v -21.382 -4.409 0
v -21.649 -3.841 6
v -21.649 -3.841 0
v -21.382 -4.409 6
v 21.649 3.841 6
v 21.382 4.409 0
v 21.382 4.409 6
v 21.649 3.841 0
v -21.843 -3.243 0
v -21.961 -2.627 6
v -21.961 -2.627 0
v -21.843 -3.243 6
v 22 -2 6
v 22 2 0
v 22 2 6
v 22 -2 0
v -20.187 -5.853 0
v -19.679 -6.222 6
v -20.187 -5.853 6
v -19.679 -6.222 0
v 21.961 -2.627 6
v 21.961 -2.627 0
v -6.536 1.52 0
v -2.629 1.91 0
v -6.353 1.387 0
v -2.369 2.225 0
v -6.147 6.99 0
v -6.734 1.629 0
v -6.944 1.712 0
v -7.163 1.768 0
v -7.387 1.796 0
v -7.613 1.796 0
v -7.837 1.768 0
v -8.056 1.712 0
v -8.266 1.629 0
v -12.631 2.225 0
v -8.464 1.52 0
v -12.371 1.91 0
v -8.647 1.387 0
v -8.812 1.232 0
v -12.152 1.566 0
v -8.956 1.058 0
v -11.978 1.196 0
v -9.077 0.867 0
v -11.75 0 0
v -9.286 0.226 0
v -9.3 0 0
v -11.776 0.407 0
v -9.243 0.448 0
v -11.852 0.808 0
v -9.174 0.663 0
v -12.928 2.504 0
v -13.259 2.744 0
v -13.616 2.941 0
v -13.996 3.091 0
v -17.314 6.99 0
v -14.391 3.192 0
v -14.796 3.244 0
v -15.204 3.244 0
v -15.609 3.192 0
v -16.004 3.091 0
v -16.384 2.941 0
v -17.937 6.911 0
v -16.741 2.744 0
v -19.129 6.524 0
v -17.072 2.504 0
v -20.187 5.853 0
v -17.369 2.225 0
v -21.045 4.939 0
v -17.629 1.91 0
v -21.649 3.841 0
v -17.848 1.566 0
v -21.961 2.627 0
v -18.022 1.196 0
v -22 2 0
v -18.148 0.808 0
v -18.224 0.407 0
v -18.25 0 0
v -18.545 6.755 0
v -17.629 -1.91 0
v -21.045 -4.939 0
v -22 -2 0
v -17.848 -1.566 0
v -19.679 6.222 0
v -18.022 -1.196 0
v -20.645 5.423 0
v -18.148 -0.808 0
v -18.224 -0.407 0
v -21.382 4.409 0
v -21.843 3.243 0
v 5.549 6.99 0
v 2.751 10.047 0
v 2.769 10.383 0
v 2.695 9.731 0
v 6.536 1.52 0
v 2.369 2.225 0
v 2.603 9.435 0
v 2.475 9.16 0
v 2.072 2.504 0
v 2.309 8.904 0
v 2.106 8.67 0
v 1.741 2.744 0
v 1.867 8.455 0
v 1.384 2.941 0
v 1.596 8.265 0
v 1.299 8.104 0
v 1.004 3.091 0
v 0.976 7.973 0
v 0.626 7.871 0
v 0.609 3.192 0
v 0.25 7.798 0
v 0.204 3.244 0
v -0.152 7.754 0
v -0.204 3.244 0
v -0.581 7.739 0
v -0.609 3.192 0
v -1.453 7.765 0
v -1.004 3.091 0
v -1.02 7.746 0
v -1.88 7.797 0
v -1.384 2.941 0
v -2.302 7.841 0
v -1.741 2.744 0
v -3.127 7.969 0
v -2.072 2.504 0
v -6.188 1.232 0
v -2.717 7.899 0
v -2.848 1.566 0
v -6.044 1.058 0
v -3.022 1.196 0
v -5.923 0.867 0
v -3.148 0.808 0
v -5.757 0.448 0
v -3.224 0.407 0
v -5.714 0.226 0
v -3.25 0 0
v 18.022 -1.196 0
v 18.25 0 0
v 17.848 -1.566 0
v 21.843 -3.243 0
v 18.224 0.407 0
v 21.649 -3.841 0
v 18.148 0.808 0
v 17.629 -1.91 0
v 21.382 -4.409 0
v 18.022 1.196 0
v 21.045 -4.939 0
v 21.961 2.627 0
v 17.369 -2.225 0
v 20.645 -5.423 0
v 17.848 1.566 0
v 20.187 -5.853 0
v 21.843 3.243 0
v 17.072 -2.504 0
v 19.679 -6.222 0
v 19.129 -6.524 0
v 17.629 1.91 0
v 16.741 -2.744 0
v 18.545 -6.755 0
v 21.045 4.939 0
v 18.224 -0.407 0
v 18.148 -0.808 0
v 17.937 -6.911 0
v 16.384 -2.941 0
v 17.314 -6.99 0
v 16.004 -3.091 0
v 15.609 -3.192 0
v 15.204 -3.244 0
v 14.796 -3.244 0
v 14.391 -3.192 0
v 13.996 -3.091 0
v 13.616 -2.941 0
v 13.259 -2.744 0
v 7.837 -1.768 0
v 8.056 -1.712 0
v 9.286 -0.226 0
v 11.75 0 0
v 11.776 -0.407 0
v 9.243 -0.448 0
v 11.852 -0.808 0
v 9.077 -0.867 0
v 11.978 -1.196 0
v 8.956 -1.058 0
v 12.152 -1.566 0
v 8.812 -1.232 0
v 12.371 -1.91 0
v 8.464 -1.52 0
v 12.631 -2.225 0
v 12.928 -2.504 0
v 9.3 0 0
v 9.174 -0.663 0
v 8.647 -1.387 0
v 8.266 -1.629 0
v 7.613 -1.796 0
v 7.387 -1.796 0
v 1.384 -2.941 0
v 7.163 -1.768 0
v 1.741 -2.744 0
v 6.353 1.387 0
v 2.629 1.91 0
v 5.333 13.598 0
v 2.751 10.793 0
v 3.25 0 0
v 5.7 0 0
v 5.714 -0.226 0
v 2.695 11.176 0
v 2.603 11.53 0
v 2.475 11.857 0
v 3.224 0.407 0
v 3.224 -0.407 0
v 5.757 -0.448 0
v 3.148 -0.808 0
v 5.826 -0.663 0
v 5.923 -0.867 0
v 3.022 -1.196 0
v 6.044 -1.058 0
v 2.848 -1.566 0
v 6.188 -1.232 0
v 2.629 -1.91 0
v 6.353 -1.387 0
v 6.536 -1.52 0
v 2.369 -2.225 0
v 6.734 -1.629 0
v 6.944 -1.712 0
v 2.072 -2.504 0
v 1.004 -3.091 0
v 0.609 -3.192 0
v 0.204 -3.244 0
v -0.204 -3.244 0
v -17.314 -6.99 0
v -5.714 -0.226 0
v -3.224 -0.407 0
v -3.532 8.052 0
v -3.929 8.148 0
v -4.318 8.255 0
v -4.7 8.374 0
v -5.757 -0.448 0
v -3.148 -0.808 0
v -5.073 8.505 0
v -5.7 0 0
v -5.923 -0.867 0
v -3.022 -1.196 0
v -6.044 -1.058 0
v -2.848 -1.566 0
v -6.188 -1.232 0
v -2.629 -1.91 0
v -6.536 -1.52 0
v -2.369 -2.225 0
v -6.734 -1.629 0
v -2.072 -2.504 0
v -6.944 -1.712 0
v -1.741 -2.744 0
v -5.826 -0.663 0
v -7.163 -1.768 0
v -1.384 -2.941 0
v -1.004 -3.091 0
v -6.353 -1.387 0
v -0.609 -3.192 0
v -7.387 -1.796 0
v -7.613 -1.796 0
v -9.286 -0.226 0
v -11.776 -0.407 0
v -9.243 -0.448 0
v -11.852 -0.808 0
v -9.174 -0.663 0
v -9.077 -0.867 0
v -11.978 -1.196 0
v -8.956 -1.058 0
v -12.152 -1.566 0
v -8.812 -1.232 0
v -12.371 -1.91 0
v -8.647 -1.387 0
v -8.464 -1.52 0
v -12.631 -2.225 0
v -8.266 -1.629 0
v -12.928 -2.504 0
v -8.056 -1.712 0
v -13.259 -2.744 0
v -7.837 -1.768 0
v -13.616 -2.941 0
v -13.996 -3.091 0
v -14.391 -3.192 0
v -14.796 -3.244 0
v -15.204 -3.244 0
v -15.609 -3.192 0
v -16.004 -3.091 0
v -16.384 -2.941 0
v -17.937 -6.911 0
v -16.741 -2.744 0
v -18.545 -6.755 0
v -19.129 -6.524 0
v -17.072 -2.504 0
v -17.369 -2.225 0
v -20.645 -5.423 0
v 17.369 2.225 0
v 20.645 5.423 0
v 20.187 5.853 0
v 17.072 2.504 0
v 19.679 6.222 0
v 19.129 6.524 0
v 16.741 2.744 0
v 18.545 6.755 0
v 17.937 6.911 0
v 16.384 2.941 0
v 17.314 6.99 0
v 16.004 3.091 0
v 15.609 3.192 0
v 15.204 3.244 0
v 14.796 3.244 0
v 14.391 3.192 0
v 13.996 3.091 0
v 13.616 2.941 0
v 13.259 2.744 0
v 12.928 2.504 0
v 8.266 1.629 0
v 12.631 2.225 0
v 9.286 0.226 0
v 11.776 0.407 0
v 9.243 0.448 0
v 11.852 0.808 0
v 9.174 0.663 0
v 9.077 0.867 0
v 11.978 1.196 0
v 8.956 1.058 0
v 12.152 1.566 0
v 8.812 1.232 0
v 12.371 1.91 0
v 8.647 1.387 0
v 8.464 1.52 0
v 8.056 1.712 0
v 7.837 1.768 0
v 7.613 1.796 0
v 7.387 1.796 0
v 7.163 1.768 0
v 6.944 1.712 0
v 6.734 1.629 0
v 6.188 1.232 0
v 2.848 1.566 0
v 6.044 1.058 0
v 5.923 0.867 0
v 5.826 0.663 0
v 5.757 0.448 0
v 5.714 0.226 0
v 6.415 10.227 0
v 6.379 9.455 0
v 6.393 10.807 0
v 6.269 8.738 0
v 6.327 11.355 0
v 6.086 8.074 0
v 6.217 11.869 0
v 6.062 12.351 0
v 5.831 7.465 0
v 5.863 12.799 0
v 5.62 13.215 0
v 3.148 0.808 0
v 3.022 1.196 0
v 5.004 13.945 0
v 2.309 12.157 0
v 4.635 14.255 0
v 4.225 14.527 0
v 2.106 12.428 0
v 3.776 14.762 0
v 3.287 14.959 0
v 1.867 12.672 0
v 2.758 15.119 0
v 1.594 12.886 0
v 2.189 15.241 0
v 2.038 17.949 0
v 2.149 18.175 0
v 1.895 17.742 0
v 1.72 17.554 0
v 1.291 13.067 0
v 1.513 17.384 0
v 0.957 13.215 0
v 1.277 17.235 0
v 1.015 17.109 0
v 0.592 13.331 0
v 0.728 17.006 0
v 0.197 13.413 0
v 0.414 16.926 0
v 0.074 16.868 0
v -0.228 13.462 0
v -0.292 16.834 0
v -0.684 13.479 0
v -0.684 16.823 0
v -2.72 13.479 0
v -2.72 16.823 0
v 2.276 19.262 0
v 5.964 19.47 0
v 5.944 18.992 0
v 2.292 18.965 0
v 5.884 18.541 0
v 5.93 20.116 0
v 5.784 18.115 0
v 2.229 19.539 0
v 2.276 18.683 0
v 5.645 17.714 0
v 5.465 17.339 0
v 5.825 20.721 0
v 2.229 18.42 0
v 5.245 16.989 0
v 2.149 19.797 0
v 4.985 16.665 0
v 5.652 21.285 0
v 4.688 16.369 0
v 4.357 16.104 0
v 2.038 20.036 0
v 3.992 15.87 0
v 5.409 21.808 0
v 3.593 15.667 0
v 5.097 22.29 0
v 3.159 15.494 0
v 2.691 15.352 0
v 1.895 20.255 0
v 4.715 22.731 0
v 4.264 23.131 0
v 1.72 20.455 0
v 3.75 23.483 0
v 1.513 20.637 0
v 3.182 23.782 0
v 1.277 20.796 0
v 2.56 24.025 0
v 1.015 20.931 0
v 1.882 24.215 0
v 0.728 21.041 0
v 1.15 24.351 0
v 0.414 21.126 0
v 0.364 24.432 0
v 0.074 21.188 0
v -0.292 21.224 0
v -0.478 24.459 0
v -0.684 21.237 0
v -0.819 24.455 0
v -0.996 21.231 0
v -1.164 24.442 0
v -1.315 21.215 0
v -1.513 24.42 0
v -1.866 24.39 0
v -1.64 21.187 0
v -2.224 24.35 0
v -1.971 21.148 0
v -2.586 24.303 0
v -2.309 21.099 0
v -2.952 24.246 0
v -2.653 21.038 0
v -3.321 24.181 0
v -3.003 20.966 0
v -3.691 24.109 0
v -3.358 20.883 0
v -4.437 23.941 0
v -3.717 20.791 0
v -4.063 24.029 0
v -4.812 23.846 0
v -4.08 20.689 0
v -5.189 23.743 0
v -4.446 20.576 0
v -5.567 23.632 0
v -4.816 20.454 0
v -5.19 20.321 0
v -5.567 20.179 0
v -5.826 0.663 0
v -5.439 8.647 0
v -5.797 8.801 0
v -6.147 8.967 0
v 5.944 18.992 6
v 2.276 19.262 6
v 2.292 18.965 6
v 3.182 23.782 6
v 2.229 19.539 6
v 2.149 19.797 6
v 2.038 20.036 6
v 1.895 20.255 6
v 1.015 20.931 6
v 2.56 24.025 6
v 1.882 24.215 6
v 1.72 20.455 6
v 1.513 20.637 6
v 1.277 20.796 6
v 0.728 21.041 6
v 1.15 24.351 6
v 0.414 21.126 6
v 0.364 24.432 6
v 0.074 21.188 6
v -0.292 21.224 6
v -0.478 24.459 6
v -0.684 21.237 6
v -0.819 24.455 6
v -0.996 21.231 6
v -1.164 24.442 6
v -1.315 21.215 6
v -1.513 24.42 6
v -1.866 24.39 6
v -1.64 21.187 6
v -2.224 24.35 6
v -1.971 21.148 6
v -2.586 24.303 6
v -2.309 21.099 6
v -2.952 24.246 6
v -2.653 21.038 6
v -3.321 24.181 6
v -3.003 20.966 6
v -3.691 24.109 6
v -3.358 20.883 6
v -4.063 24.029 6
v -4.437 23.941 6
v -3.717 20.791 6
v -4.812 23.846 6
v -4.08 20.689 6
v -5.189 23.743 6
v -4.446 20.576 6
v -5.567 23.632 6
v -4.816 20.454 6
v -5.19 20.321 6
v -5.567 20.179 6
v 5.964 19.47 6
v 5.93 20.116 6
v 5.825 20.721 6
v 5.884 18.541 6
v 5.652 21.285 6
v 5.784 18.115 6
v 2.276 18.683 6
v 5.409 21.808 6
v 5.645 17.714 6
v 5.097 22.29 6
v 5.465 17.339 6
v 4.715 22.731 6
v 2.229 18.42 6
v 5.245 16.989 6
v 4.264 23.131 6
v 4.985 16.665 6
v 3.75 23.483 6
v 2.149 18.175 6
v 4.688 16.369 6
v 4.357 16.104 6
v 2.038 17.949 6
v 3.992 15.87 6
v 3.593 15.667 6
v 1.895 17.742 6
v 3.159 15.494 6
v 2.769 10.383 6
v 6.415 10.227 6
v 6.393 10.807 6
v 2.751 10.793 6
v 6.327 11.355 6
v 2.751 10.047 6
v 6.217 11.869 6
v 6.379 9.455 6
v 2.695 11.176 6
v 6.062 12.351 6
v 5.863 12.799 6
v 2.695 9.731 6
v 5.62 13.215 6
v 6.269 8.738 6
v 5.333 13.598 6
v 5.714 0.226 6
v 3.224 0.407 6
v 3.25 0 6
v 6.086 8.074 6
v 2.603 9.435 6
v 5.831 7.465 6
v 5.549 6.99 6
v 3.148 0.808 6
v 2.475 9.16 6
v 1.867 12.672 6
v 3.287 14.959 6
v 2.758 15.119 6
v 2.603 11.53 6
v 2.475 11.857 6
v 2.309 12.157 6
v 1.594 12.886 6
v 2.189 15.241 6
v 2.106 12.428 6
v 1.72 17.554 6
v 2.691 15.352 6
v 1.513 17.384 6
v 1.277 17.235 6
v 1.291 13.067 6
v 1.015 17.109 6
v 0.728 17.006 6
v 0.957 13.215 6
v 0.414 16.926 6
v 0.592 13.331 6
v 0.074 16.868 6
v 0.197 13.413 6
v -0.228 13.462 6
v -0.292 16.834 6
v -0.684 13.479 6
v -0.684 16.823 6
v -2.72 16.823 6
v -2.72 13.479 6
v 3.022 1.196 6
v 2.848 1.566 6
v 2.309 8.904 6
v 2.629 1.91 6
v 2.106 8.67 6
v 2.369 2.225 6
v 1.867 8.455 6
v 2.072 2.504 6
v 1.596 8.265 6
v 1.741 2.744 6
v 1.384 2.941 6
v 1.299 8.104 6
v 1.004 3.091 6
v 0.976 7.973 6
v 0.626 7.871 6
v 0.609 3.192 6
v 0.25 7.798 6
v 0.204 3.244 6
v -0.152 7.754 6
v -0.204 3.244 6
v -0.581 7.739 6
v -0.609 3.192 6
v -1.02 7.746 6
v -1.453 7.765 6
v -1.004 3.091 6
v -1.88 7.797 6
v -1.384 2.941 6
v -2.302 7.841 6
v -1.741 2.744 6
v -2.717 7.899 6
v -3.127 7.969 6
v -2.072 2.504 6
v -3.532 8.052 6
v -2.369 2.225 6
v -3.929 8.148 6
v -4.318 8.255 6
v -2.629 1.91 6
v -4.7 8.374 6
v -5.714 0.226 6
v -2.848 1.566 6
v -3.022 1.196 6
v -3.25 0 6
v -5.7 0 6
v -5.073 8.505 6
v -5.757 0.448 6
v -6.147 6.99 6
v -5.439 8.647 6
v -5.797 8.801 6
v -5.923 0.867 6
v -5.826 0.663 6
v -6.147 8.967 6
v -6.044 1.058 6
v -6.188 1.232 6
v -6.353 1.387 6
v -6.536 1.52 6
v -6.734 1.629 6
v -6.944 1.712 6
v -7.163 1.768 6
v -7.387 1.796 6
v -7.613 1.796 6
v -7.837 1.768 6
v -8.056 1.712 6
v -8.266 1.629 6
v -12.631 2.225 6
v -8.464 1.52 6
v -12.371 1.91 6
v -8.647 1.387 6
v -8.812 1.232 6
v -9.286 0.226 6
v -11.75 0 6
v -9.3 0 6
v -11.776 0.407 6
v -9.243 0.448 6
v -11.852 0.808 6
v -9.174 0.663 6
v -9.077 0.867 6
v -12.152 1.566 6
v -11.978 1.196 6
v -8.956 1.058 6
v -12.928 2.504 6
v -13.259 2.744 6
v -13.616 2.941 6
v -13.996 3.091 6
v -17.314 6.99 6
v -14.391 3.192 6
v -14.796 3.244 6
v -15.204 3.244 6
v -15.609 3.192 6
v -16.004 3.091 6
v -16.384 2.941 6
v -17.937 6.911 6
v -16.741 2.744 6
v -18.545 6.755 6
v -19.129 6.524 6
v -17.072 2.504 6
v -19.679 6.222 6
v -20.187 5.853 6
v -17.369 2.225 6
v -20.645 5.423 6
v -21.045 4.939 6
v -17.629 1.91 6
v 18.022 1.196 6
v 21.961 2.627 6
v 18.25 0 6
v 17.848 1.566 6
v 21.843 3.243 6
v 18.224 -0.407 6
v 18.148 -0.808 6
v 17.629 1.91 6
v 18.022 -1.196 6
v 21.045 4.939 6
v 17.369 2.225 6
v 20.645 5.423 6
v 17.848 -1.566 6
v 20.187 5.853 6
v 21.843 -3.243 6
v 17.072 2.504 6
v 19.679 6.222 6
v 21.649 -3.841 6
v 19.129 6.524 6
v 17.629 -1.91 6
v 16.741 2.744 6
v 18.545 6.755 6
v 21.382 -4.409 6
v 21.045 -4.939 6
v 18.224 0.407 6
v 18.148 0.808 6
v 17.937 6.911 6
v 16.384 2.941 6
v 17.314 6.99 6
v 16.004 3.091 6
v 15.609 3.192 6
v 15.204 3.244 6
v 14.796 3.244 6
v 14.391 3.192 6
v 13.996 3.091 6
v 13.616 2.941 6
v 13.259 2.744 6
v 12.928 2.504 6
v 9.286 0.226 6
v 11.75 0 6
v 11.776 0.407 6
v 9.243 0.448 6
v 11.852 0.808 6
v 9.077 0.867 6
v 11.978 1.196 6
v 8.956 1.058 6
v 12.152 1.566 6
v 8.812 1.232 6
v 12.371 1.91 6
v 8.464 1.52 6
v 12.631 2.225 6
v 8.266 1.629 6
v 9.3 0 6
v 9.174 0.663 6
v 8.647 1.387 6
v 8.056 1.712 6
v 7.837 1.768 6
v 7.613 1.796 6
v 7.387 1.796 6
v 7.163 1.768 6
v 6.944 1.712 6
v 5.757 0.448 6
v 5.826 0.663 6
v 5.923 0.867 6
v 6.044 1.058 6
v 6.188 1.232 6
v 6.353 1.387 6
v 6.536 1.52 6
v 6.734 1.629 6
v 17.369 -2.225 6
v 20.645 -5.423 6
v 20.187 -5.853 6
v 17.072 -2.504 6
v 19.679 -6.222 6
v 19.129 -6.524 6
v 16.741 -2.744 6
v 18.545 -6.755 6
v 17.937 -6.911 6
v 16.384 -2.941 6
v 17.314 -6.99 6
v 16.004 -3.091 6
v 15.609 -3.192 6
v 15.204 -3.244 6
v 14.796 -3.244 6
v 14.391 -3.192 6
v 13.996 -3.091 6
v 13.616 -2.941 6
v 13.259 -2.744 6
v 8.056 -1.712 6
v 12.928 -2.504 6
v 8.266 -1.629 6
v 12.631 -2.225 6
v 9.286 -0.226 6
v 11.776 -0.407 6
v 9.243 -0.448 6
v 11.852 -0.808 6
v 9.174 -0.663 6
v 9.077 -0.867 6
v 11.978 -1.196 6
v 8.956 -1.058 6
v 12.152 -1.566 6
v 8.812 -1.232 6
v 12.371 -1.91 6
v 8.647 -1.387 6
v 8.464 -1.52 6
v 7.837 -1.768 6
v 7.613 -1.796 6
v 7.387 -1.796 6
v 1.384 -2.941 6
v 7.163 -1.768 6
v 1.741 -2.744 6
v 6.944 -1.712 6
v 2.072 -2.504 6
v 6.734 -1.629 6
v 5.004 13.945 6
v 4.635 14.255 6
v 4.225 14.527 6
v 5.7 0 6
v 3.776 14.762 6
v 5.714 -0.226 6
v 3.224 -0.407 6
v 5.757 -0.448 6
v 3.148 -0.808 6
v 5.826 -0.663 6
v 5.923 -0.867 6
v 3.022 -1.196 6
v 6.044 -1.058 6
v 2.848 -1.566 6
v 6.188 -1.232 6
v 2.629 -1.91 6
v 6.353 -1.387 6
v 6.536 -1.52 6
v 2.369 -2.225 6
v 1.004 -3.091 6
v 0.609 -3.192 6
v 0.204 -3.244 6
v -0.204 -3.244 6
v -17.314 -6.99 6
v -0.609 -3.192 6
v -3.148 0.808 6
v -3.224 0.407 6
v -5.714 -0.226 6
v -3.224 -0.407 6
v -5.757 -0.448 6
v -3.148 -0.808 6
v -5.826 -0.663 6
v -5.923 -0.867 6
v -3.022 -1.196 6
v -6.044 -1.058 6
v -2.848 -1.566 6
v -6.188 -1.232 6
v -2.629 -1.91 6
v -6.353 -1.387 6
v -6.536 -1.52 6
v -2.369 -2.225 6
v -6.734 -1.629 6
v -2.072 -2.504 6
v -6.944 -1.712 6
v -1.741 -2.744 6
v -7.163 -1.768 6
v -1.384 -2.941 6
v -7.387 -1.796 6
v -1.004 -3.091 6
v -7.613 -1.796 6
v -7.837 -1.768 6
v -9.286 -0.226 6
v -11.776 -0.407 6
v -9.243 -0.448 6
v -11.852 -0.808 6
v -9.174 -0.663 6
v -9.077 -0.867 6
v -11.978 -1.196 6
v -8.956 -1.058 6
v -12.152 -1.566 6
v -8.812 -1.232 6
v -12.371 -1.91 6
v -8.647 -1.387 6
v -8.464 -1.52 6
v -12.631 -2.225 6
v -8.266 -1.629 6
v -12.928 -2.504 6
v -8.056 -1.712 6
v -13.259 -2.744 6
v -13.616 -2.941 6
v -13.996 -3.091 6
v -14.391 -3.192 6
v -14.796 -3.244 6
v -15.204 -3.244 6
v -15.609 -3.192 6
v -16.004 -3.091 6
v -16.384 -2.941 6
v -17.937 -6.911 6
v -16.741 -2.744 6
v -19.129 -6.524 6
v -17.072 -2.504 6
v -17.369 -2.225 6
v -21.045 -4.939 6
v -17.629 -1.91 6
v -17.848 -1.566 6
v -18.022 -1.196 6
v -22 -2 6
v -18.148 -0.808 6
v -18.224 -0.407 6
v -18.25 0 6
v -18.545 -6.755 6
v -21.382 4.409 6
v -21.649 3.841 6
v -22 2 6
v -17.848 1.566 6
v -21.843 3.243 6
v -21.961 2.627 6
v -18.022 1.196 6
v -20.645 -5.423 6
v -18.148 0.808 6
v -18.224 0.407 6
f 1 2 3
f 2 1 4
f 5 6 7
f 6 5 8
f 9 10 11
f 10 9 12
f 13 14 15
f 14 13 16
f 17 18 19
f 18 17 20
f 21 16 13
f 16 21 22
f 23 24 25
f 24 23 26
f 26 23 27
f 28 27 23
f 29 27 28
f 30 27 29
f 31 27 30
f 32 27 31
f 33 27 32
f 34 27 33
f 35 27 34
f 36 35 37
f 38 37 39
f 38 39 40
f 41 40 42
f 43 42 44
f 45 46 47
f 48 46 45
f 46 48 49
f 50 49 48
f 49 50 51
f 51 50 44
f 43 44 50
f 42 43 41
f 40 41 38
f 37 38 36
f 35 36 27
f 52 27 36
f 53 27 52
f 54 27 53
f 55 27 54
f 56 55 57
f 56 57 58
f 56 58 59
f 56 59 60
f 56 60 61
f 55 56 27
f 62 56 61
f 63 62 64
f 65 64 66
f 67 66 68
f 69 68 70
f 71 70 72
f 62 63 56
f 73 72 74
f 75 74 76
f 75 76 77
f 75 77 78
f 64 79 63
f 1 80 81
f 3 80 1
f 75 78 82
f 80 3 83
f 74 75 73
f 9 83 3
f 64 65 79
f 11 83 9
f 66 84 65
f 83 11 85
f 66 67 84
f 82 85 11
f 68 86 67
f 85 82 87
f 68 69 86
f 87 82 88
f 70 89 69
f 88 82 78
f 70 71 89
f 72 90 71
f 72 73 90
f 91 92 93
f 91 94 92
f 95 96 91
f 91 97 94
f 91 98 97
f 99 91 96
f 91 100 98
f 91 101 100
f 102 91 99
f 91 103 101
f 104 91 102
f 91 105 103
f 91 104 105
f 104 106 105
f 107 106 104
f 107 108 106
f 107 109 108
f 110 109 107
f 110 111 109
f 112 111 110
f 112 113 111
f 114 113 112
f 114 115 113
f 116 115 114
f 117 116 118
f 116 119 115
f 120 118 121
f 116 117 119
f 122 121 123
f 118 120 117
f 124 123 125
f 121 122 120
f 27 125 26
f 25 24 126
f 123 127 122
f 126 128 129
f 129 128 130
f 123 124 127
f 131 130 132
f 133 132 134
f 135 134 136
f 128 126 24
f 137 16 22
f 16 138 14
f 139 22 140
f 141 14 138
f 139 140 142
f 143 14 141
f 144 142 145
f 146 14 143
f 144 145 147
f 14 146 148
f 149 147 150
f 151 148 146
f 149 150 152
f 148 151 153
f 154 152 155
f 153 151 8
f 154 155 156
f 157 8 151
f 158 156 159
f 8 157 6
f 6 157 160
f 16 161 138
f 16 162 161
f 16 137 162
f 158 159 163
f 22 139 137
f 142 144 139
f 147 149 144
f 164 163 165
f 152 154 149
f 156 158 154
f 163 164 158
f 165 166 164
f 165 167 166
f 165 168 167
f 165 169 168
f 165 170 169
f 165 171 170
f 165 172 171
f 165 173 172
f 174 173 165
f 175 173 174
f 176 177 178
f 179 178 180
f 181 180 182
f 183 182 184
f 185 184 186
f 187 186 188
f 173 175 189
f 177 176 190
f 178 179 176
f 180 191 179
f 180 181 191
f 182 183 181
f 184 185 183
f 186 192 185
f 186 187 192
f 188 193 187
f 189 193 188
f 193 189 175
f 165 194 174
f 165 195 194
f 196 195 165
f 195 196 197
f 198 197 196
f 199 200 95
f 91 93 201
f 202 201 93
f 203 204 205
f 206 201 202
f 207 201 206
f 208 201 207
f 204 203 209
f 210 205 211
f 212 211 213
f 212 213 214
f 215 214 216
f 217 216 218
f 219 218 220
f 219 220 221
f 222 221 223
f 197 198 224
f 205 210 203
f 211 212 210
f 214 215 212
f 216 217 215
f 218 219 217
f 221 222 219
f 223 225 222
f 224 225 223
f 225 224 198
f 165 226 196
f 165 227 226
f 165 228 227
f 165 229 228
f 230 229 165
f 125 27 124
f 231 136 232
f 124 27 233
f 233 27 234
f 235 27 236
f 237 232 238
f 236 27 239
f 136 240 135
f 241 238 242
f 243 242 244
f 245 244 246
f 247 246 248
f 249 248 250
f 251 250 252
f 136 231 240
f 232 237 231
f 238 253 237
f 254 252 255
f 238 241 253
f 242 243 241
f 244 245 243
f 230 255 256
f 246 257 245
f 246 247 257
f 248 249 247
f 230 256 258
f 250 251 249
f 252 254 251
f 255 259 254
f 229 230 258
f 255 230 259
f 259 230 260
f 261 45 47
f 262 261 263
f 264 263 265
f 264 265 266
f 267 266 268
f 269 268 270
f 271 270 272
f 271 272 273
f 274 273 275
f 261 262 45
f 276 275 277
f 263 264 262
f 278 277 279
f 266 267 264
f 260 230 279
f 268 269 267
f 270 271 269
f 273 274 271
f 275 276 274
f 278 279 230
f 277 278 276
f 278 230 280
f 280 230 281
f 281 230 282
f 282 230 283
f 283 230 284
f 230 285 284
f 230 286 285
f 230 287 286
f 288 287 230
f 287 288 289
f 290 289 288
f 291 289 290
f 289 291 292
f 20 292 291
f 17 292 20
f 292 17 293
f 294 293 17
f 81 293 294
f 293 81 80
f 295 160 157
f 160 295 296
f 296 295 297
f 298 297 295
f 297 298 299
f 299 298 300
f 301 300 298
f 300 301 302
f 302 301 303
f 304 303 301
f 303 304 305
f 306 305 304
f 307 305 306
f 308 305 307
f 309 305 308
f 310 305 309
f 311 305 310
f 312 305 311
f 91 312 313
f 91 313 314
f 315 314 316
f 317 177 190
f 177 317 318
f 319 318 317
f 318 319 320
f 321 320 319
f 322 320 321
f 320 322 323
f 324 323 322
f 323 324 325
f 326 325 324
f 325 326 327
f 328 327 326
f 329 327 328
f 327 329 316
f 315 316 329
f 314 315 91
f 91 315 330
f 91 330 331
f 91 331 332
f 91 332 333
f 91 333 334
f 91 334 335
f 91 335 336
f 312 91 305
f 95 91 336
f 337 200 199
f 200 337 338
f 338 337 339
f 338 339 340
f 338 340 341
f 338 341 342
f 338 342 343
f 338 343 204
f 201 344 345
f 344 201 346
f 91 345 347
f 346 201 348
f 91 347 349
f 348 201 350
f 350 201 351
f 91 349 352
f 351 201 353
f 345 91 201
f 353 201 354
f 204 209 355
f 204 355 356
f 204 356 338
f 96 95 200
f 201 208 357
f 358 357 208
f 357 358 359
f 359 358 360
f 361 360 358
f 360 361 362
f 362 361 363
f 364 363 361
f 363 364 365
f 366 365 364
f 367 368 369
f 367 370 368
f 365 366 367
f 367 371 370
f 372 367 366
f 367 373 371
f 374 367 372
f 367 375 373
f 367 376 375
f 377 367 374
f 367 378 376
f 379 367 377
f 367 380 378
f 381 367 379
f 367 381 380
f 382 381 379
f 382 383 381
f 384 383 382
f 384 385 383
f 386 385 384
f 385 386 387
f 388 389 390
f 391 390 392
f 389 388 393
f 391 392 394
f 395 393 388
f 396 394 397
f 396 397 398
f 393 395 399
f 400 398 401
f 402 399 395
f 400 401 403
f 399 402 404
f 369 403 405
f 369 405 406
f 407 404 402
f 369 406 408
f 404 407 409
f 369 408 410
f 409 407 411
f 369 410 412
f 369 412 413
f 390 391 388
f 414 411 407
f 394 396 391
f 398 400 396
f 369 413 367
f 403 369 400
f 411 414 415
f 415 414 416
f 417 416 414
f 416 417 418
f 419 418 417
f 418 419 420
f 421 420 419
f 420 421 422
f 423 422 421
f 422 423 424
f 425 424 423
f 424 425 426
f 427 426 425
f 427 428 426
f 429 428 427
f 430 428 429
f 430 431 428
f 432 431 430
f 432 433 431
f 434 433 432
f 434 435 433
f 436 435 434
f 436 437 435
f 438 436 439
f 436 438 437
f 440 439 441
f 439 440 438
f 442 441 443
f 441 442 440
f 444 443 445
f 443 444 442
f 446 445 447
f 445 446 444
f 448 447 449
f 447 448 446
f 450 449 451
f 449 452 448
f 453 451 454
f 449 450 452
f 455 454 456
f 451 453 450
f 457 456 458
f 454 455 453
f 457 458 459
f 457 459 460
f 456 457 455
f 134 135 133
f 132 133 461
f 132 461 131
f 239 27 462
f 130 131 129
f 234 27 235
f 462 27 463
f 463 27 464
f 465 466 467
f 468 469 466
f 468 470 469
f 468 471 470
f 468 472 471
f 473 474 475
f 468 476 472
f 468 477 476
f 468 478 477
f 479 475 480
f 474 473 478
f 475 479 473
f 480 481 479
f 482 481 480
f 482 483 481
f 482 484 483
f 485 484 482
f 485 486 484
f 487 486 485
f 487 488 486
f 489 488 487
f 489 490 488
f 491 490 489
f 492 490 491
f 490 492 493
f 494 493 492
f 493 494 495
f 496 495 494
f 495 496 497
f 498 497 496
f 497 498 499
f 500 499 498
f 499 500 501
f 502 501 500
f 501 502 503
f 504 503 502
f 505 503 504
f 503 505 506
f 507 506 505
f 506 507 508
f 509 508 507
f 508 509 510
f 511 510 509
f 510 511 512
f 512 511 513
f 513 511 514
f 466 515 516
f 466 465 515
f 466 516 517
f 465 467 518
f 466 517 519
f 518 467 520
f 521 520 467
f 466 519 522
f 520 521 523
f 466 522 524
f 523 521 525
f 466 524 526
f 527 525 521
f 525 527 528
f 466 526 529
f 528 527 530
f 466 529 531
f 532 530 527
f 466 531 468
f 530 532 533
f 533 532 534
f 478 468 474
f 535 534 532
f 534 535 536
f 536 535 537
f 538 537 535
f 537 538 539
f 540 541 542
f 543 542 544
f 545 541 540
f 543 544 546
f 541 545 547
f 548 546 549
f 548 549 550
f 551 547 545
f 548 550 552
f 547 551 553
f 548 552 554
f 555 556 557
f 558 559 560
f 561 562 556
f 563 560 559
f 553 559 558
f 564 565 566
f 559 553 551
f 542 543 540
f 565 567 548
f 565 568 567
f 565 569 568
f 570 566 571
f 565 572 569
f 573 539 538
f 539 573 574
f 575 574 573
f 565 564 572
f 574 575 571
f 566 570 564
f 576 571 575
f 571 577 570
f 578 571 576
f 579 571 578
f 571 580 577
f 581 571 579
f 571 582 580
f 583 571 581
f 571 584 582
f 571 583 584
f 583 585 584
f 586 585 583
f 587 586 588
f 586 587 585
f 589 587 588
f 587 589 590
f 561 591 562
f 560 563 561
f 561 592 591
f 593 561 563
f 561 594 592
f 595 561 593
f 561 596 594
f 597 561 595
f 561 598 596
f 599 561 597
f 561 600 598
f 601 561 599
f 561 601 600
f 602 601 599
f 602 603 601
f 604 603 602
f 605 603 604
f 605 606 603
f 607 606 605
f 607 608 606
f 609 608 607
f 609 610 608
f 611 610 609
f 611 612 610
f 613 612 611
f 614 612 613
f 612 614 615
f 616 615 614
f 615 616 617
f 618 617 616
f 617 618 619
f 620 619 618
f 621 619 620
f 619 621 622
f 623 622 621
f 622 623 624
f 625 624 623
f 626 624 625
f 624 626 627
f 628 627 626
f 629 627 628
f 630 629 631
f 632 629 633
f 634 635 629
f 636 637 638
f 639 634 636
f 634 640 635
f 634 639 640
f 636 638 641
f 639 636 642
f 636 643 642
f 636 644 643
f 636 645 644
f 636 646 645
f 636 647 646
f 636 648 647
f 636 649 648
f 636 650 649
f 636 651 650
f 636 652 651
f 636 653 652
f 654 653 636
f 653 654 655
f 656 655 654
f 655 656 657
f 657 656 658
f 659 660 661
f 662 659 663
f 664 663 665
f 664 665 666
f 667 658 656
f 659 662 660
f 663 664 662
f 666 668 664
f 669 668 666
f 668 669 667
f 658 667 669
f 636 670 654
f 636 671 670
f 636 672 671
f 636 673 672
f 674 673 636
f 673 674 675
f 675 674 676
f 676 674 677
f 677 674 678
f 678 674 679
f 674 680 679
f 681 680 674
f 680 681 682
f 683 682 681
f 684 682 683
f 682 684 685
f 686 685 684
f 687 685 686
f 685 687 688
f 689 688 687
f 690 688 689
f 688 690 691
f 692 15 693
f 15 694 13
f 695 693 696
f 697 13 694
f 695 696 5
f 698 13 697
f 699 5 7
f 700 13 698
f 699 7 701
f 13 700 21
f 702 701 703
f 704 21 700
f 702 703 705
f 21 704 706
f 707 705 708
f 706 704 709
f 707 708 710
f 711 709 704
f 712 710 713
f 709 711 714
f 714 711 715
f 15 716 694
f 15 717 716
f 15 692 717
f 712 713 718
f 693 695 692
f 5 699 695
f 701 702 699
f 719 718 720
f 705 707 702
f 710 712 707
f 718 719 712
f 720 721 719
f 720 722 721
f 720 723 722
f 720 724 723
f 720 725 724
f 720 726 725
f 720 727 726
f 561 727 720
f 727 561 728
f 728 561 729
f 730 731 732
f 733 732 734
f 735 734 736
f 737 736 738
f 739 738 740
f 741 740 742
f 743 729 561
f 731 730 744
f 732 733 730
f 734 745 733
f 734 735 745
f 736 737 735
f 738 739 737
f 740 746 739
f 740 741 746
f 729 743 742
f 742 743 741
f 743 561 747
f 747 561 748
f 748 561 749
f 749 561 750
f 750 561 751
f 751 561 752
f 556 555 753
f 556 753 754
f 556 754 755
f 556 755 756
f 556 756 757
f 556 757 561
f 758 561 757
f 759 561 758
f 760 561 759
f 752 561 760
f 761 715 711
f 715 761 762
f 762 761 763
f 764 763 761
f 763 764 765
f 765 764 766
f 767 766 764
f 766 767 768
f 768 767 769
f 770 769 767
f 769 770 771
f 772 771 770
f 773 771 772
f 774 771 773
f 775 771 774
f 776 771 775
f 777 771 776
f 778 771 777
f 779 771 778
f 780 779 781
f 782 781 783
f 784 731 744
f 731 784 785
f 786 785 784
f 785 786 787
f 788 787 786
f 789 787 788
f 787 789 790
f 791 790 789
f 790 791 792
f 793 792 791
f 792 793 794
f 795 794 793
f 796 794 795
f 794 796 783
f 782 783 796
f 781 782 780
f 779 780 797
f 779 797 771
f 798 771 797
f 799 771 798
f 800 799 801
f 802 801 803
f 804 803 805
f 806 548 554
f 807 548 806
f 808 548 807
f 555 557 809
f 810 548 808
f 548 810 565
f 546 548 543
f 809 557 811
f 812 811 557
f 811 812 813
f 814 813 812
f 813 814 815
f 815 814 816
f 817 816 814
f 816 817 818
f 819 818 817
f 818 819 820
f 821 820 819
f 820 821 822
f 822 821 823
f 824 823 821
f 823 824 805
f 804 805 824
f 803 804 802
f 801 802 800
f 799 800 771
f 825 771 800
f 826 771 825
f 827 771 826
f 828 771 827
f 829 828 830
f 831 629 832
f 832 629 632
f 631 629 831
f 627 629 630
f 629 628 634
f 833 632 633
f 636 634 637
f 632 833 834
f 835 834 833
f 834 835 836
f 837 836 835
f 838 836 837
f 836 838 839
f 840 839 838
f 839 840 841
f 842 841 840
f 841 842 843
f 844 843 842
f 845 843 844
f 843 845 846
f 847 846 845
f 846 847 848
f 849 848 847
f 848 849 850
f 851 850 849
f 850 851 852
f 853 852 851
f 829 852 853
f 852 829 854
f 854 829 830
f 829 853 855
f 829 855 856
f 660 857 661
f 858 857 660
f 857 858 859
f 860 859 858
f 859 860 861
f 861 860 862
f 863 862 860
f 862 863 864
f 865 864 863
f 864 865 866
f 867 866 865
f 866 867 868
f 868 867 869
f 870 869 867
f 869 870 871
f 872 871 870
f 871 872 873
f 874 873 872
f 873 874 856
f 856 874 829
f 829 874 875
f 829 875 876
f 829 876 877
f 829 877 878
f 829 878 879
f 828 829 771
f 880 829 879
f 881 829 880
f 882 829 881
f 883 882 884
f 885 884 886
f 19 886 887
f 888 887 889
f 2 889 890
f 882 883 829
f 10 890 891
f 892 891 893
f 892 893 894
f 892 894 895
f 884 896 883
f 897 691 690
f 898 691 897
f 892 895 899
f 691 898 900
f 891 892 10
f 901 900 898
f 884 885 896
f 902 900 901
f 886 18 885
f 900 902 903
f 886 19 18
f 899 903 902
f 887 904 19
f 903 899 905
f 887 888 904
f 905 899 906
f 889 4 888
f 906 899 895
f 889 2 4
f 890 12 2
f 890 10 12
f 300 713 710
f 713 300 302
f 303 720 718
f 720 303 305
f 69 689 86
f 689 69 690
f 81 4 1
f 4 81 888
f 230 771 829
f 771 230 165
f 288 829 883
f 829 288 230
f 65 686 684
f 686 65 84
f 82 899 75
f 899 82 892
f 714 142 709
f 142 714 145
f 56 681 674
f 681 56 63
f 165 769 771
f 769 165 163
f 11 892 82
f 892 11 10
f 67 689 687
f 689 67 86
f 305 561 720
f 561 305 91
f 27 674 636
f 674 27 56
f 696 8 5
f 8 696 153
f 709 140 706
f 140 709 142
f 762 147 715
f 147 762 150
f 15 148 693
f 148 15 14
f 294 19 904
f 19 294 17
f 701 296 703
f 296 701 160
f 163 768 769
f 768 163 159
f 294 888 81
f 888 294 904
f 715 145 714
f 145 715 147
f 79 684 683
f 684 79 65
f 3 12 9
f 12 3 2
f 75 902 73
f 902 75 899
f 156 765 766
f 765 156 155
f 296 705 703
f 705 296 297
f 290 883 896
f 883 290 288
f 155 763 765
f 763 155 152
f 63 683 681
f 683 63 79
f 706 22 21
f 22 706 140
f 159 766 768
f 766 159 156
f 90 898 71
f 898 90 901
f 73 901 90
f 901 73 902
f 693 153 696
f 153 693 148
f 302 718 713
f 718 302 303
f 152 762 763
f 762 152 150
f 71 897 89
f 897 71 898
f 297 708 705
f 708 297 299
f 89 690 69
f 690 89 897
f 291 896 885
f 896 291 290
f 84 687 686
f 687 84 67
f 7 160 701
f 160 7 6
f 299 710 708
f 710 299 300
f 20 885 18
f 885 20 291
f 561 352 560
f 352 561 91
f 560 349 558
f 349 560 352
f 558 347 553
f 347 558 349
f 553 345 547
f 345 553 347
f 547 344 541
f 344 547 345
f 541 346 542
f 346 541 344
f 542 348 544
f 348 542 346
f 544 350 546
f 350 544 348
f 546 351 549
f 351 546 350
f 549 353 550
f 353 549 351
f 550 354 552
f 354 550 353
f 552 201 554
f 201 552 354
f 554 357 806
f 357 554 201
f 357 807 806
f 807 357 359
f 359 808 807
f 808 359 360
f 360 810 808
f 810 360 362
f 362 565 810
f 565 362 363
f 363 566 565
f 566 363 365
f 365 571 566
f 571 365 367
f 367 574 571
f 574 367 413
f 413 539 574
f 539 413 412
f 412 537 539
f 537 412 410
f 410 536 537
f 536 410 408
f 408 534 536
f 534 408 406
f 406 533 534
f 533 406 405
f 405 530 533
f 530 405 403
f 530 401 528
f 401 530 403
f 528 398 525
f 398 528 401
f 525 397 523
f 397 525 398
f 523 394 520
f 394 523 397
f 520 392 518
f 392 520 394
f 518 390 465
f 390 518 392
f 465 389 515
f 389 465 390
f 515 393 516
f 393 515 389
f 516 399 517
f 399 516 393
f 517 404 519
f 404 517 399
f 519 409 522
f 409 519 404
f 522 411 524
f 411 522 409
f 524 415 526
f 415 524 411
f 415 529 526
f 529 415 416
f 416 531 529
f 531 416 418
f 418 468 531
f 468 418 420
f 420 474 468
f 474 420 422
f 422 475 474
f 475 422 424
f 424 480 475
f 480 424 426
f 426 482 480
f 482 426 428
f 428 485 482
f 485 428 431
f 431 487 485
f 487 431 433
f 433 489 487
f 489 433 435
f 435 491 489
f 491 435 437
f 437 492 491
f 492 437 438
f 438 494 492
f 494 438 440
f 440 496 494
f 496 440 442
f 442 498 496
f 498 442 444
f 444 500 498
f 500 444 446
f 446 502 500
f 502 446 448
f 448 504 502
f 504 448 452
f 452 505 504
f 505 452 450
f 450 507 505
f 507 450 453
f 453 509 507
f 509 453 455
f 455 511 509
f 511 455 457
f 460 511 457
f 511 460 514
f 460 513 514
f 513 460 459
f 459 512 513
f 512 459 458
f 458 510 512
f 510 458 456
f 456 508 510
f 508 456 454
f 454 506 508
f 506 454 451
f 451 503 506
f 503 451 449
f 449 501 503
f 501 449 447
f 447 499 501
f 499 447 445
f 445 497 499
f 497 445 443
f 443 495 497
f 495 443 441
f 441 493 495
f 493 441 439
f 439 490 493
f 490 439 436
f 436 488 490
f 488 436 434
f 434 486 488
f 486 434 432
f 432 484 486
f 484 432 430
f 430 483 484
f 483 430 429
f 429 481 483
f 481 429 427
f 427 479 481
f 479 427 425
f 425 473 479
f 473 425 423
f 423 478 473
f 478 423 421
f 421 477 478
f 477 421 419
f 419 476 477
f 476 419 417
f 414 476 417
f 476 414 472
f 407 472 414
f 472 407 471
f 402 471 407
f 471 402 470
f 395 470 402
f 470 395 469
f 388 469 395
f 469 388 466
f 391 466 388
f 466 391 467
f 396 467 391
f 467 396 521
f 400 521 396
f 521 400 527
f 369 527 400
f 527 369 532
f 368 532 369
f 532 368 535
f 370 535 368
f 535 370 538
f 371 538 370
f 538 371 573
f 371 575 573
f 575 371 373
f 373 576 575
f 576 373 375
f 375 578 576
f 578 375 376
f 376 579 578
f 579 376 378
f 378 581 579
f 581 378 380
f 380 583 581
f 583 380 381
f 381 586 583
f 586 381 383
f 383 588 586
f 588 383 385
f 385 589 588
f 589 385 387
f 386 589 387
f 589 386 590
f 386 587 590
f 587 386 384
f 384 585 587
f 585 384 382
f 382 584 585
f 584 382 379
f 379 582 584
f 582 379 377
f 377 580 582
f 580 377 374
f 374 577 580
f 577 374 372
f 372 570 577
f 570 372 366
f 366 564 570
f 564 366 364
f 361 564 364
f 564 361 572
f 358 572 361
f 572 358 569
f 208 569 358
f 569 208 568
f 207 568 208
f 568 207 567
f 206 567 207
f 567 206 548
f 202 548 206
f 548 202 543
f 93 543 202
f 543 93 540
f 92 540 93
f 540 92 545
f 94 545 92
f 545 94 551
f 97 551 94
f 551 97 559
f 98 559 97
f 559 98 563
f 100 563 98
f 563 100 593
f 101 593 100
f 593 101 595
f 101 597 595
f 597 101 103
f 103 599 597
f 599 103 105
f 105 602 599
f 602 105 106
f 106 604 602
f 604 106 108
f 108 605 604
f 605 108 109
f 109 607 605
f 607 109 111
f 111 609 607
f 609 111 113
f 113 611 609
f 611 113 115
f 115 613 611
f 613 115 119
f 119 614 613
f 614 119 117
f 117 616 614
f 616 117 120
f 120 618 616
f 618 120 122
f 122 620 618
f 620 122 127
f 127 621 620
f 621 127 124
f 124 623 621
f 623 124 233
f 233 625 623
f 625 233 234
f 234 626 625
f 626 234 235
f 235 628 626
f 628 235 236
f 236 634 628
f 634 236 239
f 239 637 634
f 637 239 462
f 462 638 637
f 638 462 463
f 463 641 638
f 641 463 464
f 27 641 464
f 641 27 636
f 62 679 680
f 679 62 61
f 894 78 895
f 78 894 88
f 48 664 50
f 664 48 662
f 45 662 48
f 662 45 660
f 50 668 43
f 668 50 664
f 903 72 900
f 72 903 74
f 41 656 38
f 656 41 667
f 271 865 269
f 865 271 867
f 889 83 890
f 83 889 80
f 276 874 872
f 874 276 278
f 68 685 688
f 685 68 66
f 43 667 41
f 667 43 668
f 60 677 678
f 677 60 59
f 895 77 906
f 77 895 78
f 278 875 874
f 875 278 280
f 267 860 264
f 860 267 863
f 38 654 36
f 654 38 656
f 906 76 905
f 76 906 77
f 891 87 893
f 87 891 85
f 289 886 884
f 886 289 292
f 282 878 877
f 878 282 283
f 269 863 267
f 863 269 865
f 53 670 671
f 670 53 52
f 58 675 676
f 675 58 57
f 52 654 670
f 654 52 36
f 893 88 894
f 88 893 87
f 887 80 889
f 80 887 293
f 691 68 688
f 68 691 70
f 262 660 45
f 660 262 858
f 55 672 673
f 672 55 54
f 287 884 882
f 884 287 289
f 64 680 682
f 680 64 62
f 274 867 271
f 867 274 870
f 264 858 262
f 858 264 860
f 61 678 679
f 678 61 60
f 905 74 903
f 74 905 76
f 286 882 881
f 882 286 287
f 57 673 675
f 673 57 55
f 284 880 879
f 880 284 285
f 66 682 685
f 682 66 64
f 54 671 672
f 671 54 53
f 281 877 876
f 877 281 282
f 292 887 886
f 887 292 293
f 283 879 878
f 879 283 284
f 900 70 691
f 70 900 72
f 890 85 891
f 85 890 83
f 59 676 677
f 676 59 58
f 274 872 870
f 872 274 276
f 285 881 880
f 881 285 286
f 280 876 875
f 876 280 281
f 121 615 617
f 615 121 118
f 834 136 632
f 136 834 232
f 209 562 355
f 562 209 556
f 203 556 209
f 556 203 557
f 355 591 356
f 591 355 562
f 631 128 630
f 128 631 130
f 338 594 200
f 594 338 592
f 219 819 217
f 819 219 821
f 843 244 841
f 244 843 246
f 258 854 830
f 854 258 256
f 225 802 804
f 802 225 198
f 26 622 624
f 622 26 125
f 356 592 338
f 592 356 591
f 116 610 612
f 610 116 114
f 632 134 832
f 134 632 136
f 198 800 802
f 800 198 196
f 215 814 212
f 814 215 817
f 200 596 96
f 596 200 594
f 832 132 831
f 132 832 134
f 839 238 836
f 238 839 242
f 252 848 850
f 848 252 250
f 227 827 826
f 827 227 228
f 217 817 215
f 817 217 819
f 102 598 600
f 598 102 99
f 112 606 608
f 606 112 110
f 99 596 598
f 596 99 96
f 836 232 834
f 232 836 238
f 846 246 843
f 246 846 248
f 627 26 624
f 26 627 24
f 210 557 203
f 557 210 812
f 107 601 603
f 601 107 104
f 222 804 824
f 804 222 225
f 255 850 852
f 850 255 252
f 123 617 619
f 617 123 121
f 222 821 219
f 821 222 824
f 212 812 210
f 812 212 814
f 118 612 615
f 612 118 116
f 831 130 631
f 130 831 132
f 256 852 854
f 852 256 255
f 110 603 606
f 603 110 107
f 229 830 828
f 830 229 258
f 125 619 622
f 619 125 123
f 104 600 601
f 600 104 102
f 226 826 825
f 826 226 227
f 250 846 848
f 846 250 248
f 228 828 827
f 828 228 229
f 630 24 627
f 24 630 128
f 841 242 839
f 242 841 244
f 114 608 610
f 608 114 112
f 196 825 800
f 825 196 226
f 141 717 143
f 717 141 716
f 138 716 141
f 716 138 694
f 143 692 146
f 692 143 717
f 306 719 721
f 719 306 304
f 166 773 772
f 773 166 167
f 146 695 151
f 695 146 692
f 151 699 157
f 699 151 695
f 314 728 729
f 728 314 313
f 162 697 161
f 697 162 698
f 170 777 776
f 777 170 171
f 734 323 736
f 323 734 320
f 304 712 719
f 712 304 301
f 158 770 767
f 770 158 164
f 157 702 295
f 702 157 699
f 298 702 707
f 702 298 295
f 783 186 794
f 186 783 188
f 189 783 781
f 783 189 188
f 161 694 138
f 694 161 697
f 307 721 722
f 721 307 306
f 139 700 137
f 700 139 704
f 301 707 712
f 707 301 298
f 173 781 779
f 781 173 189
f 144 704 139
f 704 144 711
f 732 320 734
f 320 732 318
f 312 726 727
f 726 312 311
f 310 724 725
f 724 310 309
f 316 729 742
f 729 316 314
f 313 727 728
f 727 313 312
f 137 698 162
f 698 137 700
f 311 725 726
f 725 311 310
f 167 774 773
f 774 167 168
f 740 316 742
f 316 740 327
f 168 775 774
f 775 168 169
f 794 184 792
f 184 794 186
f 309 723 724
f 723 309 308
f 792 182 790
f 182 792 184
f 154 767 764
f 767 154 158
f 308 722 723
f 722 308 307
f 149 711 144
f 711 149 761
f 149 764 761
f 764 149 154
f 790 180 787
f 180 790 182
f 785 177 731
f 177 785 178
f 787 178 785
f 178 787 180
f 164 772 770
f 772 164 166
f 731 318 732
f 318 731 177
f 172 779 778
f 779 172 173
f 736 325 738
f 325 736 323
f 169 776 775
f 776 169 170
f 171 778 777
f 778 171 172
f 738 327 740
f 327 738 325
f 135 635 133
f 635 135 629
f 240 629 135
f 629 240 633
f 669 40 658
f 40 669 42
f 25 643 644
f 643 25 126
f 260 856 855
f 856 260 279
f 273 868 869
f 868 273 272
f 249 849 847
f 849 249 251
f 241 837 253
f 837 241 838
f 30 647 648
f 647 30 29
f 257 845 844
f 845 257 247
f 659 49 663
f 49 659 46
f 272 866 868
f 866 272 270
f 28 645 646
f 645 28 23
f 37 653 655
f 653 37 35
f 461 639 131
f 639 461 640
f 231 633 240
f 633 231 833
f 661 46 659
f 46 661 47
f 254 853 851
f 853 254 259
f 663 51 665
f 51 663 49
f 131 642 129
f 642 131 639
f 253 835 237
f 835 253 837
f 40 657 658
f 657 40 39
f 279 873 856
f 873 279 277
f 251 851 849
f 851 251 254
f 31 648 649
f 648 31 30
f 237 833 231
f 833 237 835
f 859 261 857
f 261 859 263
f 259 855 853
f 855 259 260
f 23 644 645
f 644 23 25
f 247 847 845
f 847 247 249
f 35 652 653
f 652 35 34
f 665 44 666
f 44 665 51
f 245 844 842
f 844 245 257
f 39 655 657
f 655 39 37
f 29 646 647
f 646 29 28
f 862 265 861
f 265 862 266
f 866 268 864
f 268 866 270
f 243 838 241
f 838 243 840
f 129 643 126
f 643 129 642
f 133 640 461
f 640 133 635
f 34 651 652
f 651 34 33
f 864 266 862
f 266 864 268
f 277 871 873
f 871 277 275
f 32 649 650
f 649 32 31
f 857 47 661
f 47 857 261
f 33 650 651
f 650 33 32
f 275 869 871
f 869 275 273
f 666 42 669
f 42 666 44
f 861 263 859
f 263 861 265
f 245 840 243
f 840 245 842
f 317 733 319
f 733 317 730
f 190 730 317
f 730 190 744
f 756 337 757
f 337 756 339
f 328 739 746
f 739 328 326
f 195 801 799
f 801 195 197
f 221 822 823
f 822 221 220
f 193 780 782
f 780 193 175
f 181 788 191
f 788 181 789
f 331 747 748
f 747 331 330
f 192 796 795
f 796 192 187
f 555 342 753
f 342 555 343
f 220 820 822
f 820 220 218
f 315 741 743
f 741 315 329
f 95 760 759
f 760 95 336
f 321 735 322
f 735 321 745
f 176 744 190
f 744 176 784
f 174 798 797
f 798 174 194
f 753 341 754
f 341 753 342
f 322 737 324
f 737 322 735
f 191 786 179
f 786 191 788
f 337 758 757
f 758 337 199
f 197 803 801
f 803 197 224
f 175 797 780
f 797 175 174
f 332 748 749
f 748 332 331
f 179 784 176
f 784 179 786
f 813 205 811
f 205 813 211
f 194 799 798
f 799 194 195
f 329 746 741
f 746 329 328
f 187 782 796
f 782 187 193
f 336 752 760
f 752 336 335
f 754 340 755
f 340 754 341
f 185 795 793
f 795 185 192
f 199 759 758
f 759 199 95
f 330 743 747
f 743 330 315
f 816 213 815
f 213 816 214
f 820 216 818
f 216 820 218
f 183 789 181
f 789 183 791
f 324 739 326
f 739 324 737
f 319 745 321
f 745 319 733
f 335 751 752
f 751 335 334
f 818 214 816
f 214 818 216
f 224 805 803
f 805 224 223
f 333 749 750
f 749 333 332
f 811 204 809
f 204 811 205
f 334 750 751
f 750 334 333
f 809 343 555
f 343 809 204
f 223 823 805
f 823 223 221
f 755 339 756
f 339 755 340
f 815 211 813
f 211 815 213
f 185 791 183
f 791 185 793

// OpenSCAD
$fn = 50;


difference() {
	union() {
		hull() {
			translate(v = [-17.0000000000, 2.0000000000, 0]) {
				cylinder(h = 6, r = 5);
			}
			translate(v = [17.0000000000, 2.0000000000, 0]) {
				cylinder(h = 6, r = 5);
			}
			translate(v = [-17.0000000000, -2.0000000000, 0]) {
				cylinder(h = 6, r = 5);
			}
			translate(v = [17.0000000000, -2.0000000000, 0]) {
				cylinder(h = 6, r = 5);
			}
		}
		translate(v = [0, 24, 0]) {
			linear_extrude(height = 6) {
				text(font = "DejaVu Sans Mono:style=Bold", halign = "center", size = 19.0000000000, text = "3", valign = "top");
			}
		}
	}
	union() {
		translate(v = [-15.0000000000, 0.0000000000, 0]) {
			translate(v = [0, 0, -100]) {
				cylinder(h = 200, r = 3.2500000000);
			}
		}
		translate(v = [0, 0, -100]) {
			cylinder(h = 200, r = 3.2500000000);
		}
		translate(v = [15.0000000000, 0.0000000000, 0]) {
			translate(v = [0, 0, -100]) {
				cylinder(h = 200, r = 3.2500000000);
			}
		}
		translate(v = [-15.0000000000, 0.0000000000, 0]) {
			translate(v = [0, 0, -100]) {
				cylinder(h = 200, r = 1.8000000000);
			}
		}
		translate(v = [-7.5000000000, 0.0000000000, 0]) {
			translate(v = [0, 0, -100]) {
				cylinder(h = 200, r = 1.8000000000);
			}
		}
		translate(v = [0, 0, -100]) {
			cylinder(h = 200, r = 1.8000000000);
		}
		translate(v = [7.5000000000, 0.0000000000, 0]) {
			translate(v = [0, 0, -100]) {
				cylinder(h = 200, r = 1.8000000000);
			}
		}
		translate(v = [15.0000000000, 0.0000000000, 0]) {
			translate(v = [0, 0, -100]) {
				cylinder(h = 200, r = 1.8000000000);
			}
		}
	}
}
